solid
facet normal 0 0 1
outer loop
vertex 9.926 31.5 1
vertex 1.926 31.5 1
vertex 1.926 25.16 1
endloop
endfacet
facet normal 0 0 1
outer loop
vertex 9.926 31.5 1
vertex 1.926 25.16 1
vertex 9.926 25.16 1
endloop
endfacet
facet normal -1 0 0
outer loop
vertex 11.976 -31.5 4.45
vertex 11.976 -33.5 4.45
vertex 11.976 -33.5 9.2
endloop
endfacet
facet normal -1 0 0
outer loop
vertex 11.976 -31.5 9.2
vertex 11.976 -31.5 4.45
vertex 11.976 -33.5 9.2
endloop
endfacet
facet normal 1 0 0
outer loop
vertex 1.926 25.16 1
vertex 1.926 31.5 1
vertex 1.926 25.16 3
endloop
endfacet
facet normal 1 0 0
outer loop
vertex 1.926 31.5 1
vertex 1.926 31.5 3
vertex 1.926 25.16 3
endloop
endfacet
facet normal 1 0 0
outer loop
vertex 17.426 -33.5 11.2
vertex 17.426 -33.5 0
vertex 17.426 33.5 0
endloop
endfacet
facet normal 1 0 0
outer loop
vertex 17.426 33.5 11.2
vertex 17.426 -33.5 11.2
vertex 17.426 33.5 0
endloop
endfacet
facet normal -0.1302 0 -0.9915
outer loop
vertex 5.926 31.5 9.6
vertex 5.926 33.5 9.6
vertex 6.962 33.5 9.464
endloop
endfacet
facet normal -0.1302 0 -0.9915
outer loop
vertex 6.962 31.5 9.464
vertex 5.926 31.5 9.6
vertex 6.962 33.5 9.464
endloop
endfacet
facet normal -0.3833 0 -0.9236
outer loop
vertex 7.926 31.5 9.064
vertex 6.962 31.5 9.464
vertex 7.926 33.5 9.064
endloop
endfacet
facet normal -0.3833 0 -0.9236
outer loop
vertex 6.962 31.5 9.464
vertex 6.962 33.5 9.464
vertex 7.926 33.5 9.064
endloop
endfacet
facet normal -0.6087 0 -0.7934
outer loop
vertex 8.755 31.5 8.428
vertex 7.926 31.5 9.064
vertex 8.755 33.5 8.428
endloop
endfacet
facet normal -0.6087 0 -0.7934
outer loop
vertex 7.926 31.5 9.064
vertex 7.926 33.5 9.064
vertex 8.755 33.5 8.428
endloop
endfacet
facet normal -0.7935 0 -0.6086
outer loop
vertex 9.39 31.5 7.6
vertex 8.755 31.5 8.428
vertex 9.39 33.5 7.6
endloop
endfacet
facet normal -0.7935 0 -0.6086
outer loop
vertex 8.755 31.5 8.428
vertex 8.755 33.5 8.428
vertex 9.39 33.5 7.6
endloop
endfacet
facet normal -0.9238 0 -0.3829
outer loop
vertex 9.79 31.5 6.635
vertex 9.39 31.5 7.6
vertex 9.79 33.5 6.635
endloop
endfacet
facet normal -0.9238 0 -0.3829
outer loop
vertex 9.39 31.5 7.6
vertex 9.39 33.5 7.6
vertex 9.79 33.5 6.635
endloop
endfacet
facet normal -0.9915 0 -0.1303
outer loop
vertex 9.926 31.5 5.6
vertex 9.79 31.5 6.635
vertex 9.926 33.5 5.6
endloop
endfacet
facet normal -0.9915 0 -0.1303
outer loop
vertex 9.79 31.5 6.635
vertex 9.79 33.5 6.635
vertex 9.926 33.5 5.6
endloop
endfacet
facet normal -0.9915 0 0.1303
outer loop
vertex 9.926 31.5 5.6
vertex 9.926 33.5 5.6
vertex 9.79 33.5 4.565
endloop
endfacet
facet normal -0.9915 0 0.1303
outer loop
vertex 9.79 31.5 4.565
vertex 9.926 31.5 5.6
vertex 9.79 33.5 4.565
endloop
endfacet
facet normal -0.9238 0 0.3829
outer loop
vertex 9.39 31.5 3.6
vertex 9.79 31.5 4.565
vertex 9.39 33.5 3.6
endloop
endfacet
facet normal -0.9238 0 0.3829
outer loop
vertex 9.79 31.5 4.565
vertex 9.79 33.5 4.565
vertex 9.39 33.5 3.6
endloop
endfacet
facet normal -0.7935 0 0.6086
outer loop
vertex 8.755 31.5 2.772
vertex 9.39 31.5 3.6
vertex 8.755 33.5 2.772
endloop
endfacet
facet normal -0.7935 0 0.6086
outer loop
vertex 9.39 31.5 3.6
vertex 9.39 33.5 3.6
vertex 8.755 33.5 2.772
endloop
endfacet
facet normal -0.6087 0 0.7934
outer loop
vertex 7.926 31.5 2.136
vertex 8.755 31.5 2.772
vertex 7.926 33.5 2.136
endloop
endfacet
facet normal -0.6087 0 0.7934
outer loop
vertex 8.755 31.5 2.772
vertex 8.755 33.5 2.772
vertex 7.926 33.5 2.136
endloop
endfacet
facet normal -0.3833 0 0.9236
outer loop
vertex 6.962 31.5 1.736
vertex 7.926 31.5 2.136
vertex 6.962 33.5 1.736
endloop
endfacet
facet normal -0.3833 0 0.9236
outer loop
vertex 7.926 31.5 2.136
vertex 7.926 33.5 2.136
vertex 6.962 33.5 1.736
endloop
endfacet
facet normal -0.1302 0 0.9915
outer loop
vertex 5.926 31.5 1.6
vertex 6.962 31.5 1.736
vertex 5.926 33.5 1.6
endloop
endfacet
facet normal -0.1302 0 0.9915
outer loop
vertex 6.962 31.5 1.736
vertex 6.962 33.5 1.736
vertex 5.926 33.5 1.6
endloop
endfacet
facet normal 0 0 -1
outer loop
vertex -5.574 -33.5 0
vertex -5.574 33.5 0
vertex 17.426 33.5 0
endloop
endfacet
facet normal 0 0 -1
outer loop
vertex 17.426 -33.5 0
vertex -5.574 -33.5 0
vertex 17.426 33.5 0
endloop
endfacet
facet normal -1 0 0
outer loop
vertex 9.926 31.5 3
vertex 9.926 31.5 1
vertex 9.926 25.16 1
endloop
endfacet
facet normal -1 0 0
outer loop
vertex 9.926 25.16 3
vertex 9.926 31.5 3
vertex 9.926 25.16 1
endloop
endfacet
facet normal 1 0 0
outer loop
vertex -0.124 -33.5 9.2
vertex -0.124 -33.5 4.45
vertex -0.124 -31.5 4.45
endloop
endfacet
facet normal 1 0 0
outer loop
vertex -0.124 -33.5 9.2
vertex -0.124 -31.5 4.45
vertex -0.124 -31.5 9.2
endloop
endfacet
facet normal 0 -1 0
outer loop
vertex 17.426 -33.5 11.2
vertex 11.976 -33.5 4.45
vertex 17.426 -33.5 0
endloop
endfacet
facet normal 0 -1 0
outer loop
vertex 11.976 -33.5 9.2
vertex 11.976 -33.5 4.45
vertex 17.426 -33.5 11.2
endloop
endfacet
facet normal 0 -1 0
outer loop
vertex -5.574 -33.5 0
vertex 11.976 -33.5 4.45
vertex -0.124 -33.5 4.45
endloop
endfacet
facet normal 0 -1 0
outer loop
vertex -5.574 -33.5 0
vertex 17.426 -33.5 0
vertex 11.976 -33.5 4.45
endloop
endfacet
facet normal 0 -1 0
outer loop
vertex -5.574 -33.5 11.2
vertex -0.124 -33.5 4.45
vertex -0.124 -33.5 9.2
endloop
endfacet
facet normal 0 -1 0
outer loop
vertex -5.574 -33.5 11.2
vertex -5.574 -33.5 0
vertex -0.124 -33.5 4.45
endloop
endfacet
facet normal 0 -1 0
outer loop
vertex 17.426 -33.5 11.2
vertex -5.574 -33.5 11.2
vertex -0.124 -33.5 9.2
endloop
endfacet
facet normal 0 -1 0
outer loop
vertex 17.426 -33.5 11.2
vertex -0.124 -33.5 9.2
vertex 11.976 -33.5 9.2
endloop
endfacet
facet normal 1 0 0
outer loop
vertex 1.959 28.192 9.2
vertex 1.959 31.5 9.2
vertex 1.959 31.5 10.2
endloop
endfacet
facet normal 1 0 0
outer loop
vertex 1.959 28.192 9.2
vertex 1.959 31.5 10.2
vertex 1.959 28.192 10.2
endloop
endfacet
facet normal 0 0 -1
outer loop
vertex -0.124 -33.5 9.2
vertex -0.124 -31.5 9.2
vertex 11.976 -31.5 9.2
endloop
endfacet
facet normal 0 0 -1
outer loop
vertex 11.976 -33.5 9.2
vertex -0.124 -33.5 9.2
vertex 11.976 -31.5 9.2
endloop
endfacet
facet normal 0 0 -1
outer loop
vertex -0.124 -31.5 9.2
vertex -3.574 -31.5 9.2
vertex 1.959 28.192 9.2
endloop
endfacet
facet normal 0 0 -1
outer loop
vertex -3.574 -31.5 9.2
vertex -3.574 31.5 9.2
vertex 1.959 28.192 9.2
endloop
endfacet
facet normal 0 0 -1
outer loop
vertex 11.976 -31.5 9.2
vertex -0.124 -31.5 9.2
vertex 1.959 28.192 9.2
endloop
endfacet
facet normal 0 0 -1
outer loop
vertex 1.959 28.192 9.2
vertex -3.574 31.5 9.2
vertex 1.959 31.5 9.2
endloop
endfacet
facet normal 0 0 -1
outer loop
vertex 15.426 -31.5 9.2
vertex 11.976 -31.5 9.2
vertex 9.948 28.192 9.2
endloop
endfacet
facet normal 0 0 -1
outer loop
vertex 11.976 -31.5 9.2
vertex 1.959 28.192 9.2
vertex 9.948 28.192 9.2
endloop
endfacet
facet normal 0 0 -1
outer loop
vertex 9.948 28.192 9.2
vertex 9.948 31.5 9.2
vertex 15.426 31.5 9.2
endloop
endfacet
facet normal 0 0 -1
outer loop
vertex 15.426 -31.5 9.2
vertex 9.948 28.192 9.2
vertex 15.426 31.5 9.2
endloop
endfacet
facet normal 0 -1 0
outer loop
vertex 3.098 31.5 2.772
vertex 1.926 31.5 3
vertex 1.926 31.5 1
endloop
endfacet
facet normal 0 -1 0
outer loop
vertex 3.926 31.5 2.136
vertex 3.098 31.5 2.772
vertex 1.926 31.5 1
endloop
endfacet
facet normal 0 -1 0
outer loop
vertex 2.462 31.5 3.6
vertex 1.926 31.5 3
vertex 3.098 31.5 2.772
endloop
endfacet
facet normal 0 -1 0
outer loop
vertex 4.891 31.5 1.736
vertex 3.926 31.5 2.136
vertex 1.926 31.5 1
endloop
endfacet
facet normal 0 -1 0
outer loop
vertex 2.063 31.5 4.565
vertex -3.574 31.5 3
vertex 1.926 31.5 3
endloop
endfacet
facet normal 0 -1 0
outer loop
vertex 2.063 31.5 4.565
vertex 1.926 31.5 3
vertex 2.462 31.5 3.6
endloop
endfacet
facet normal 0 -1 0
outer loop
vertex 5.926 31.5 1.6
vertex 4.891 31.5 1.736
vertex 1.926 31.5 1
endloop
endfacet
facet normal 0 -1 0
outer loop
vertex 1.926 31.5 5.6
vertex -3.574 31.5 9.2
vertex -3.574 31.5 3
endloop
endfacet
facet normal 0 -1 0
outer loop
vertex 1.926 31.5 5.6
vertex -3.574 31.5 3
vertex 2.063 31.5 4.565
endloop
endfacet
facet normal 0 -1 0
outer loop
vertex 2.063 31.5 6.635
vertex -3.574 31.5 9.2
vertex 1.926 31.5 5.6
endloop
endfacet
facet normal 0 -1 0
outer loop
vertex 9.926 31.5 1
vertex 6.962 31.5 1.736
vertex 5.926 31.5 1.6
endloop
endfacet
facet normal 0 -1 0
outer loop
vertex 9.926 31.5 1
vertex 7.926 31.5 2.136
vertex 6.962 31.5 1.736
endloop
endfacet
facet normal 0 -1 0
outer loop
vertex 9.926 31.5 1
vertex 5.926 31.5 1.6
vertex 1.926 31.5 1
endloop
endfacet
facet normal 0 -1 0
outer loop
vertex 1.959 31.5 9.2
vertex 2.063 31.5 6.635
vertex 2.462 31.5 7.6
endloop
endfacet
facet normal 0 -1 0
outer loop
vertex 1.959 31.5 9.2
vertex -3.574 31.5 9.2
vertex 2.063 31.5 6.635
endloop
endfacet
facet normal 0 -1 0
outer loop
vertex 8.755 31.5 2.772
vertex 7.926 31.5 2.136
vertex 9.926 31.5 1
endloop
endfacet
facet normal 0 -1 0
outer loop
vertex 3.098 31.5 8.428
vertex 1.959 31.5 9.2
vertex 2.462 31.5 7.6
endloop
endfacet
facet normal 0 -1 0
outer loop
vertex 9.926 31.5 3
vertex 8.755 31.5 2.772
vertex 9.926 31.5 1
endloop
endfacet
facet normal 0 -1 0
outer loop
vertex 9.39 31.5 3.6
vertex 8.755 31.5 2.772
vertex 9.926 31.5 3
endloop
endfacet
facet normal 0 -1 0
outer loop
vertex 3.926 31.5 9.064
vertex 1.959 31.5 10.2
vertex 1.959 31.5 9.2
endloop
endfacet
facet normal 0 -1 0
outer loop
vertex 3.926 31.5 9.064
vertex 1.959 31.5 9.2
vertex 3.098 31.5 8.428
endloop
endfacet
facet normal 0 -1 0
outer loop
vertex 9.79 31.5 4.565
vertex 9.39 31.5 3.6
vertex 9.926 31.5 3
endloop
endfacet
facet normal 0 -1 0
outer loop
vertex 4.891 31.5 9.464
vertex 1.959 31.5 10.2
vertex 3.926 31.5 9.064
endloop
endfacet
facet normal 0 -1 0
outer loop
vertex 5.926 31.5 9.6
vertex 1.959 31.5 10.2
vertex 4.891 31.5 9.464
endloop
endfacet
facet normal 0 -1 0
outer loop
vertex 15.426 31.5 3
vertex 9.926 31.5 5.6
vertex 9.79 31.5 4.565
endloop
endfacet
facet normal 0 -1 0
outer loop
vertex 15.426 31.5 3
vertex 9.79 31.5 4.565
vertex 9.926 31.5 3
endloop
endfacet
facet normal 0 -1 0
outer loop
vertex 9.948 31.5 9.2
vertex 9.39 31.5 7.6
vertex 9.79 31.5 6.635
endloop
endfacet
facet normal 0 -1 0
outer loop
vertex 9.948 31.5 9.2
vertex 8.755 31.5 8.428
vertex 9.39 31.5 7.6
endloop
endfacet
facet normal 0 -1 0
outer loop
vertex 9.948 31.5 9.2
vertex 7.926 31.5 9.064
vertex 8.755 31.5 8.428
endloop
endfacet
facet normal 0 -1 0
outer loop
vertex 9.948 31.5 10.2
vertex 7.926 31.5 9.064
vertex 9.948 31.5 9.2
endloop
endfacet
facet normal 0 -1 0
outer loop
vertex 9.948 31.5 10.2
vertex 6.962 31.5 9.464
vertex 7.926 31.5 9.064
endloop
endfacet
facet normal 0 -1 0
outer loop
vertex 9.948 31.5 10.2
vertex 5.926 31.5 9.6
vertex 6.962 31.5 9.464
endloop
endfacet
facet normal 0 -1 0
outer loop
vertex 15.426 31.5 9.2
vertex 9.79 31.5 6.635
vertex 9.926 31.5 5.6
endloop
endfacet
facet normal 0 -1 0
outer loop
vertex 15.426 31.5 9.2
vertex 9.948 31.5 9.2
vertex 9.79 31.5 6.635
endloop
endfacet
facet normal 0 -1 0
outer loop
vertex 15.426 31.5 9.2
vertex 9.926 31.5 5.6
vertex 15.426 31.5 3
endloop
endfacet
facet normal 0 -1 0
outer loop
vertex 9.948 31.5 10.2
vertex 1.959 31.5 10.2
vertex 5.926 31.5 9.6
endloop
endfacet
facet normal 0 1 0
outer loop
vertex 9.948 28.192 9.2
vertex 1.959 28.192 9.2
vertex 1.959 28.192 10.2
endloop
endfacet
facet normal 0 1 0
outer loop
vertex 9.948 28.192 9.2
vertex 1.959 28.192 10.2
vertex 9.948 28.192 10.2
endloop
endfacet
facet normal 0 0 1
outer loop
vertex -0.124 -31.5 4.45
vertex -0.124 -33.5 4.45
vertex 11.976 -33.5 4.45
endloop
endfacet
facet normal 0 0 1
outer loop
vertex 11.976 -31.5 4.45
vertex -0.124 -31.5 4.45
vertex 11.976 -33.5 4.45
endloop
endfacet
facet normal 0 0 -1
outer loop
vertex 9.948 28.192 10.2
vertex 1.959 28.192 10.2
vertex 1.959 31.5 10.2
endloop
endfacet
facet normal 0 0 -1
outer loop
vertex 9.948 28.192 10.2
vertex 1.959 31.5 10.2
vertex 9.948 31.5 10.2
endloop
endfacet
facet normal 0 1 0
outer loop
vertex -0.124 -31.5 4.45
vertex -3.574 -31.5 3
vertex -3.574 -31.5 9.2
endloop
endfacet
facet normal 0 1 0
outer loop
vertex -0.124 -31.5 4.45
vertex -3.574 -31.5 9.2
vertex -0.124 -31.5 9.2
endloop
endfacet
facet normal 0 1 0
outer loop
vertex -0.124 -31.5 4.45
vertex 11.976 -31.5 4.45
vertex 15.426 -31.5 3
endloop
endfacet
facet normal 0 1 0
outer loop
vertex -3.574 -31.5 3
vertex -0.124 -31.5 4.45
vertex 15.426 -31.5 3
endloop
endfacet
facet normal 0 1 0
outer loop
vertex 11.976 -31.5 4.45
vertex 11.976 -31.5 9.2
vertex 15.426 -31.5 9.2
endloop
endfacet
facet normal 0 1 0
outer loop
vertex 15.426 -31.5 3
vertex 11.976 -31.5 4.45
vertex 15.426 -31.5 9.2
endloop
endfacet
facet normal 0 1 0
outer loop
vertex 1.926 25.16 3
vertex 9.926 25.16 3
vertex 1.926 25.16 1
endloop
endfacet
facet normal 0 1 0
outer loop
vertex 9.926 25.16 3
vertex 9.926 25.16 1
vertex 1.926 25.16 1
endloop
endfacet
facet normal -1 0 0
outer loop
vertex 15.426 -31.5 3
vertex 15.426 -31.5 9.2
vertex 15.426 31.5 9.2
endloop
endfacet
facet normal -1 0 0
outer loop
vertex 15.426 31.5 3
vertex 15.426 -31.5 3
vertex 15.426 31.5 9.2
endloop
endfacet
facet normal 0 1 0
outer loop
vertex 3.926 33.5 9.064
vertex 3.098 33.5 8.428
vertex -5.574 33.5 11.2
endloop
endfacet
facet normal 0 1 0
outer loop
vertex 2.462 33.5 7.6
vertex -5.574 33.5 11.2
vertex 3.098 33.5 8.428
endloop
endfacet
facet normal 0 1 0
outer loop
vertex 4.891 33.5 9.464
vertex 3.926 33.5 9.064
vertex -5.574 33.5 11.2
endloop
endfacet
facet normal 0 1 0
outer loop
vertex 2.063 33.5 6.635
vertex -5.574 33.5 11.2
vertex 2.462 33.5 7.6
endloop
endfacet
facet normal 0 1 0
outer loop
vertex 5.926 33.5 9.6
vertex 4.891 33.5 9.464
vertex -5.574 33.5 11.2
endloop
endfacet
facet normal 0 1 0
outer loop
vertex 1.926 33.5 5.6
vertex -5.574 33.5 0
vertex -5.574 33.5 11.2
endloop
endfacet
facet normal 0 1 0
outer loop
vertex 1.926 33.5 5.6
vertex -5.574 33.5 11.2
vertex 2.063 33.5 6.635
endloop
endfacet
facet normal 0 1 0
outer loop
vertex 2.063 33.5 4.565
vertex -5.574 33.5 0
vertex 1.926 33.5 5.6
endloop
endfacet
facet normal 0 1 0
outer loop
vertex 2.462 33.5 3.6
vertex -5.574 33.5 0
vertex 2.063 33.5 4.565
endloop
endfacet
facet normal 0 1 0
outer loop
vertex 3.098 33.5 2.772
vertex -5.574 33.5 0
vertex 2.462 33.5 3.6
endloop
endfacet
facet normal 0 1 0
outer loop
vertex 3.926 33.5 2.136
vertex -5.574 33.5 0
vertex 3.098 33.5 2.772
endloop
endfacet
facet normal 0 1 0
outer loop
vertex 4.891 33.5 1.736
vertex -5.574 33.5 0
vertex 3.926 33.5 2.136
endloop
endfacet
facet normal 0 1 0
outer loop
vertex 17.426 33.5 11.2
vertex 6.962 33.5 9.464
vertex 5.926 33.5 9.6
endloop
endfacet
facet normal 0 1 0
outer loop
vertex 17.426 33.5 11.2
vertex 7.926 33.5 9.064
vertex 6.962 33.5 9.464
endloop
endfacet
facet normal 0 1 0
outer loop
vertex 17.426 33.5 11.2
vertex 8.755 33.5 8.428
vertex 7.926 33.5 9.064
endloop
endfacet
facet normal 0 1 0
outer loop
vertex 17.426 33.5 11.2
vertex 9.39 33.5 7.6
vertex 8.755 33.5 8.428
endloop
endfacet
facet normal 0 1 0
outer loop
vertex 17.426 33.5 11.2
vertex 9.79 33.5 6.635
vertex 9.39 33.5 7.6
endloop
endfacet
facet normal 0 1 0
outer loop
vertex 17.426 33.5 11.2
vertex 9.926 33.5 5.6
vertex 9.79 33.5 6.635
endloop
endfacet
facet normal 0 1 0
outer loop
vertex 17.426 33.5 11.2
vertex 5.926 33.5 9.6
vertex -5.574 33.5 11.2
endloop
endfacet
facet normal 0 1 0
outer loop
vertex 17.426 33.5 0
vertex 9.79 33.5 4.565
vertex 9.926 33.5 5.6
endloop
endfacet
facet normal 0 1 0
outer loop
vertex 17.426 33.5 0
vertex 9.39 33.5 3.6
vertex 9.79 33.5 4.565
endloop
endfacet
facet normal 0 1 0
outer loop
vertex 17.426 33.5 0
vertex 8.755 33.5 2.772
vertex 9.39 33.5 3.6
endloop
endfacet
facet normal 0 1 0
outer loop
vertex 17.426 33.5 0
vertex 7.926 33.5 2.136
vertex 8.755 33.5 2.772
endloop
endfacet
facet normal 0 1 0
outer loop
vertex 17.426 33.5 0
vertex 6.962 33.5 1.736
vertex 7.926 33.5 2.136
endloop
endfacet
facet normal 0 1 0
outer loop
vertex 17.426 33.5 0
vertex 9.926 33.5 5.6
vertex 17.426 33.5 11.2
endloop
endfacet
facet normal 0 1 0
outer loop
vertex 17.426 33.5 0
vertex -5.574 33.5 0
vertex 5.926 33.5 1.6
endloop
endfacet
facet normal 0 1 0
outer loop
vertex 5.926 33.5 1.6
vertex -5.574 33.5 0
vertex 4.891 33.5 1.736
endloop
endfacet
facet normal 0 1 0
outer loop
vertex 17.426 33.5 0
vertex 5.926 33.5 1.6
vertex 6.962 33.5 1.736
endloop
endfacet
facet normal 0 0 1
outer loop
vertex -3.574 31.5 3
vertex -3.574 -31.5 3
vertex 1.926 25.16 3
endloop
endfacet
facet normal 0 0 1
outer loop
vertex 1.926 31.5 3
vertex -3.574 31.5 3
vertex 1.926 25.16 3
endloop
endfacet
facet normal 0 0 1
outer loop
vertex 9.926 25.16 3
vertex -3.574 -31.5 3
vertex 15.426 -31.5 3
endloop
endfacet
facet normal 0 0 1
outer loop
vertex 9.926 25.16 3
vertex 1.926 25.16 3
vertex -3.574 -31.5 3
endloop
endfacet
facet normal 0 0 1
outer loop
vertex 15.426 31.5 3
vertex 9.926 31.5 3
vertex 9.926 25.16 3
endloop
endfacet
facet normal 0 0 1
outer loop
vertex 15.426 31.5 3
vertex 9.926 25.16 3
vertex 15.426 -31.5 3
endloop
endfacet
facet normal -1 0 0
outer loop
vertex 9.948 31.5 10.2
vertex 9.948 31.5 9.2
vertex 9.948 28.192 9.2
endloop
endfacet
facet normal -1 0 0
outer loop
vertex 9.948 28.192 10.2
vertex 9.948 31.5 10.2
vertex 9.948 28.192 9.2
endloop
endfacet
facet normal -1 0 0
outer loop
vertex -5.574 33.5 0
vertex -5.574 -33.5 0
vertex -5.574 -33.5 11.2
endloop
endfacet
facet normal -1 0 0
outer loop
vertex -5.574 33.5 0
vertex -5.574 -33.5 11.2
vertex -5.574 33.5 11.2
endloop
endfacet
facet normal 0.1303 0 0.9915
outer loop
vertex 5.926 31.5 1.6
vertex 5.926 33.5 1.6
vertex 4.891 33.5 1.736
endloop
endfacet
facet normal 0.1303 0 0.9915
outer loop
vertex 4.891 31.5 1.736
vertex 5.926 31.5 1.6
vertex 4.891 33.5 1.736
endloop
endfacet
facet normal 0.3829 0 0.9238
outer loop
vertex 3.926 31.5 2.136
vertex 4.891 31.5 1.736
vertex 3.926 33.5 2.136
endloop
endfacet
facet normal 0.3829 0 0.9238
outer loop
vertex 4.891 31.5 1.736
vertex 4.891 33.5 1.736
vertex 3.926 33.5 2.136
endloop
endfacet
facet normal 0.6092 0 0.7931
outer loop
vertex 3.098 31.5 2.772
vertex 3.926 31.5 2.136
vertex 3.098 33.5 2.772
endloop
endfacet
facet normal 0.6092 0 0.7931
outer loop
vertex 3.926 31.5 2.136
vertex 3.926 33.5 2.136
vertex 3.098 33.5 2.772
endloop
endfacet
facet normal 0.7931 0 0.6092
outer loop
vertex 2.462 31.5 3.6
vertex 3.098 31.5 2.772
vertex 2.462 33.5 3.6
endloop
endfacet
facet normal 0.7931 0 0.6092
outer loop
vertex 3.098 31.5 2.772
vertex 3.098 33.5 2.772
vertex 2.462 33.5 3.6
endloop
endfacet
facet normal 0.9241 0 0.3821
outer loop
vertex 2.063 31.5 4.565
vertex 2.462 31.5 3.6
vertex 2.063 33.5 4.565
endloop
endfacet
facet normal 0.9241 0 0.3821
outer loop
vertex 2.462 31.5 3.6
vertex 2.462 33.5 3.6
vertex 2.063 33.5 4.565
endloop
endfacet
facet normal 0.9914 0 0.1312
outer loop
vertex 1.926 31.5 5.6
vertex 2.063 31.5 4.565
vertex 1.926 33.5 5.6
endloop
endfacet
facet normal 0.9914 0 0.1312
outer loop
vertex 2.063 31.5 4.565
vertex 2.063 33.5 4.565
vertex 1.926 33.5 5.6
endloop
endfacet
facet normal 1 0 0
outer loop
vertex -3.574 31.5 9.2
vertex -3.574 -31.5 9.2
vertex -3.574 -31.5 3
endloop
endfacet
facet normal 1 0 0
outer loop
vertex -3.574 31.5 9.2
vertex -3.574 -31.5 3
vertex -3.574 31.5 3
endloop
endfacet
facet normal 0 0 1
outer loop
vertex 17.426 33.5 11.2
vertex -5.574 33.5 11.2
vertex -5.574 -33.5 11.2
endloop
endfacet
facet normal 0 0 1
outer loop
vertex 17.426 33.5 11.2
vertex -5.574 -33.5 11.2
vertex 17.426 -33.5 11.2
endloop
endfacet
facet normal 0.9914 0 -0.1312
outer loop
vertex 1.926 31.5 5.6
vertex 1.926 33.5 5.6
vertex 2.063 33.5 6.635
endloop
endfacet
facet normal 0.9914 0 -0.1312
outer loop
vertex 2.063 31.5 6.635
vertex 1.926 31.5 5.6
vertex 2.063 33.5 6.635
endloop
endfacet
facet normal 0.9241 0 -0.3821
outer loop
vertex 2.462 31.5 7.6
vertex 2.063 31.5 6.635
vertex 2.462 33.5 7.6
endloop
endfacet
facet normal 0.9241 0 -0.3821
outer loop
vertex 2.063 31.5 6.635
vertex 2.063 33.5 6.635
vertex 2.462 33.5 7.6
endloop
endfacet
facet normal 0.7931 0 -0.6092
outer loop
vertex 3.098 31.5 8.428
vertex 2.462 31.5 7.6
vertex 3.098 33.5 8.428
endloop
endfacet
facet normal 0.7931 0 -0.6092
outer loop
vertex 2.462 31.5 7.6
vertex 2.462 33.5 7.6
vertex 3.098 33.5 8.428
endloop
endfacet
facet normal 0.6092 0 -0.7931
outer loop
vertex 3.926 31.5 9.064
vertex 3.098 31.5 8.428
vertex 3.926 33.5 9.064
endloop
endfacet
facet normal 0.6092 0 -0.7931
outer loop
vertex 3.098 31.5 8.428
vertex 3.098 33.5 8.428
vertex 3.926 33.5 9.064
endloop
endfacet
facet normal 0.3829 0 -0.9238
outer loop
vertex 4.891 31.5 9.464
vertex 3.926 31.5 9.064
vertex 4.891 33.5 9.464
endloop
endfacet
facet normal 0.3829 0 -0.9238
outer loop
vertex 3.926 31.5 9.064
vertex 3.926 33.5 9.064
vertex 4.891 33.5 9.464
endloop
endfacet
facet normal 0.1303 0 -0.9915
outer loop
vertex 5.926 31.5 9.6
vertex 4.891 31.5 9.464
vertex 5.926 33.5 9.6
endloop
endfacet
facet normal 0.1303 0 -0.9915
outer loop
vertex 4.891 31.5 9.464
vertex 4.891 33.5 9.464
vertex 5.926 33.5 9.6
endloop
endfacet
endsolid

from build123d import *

# Parameters (mm, degrees)
F0_W      = 23
F0_H      = 67
F1_DEPTH  = 11.2
F2_W      = 19
F2_H      = 63
F3_DEPTH  = 9.2
F4_W      = 12.1
F4_H      = 13.5
F5_DEPTH  = 12
F7_DEPTH  = 2
F9_DEPTH  = 1
F11_DEPTH = 1
F12_W     = 63
F12_H     = 1.9999997959
F13_DEPTH = 21
F14_DEPTH = 2
F15_W     = 7.9889474437
F15_H     = 3.3084521592
F16_DEPTH = 1


with BuildPart() as f1:
    # F0 (on Top) → F1 (new body)
    with BuildSketch(Plane.XY):
        with Locations((5.9262745458, 0)):
            Rectangle(F0_W, F0_H)
    extrude(amount=F1_DEPTH)

    # F2 (on face) → F3 (cut)
    with BuildSketch(Plane.XY.offset(11.2)):
        with Locations((5.9262745458, 0)):
            Rectangle(F2_W, F2_H)
    extrude(amount=-F3_DEPTH, mode=Mode.SUBTRACT)

    # F4 (on face) → F5 (cut)
    with BuildSketch(Plane.XZ.offset(33.5)):
        with Locations((5.9262745458, 11.2)):
            Rectangle(F4_W, F4_H)
    extrude(amount=-F5_DEPTH, mode=Mode.SUBTRACT)

    # F6 (on face) → F7 (cut)
    with BuildSketch(Plane(origin=(0, 33.5, 0), x_dir=(-1, 0, 0), z_dir=(0, 1, 0))):
        with BuildLine():
            ThreePointArc((-5.9262745458, 9.6), (-8.7547016705, 8.4284271247), (-9.9262745458, 5.6))
            Line((-9.9262745458, 5.6), (-5.9262745458, 5.6))
            Line((-5.9262745458, 5.6), (-5.9262745458, 9.6))
        make_face()
        with BuildLine():
            Line((-5.9262745458, 5.6), (-9.9262745458, 5.6))
            ThreePointArc((-9.9262745458, 5.6), (-8.7547016705, 2.7715728753), (-5.9262745458, 1.6))
            Line((-5.9262745458, 1.6), (-5.9262745458, 5.6))
        make_face()
        with BuildLine():
            Line((-5.9262745458, 9.6), (-5.9262745458, 5.6))
            Line((-5.9262745458, 5.6), (-1.9262745458, 5.6))
            ThreePointArc((-1.9262745458, 5.6), (-3.097847421, 8.4284271247), (-5.9262745458, 9.6))
        make_face()
        with BuildLine():
            Line((-1.9262745458, 5.6), (-5.9262745458, 5.6))
            Line((-5.9262745458, 5.6), (-5.9262745458, 1.6))
            ThreePointArc((-5.9262745458, 1.6), (-3.097847421, 2.7715728753), (-1.9262745458, 5.6))
        make_face()
    extrude(amount=-F7_DEPTH, mode=Mode.SUBTRACT)

    # F8 (on face) → F9 (cut)
    with BuildSketch(Plane.XY.offset(2)):
        Polygon((4.1827149684, 31.5), (1.9262745458, 31.5), (1.9262745458, 25.1600015908), (9.9262745458, 25.1600015908), (9.9262745458, 31.5), (7.6698341232, 31.5), align=None)
    extrude(amount=-F9_DEPTH, mode=Mode.SUBTRACT)

    # F10 (on face) → F11 (join)
    with BuildSketch(Plane.XY.offset(2)):
        Polygon((1.9262745458, 31.5), (-3.5737254542, 31.5), (-3.5737254542, -31.5), (15.4262745458, -31.5), (15.4262745458, 31.5), (9.9262745458, 31.5), (9.9262745458, 25.1600015908), (1.9262745458, 25.1600015908), align=None)
    extrude(amount=F11_DEPTH)

    # F12 (on face) → F13 (join)
    with BuildSketch(Plane.YZ.offset(-3.5737254542)):
        with Locations((0, 10.2000001021)):
            Rectangle(F12_W, F12_H)
    extrude(amount=F13_DEPTH)

    # F14 (add): a face of the model
    f14_faces = [f1.faces().sort_by_distance(p)[0] for p in [
        (5.9262745458, -31.5, 10.2000001021),
    ]]
    extrude(f14_faces, amount=F14_DEPTH)

    # F15 (on face) → F16 (cut)
    with BuildSketch(Plane(origin=(0, 0, 9.2000002041), x_dir=(1, 0, 0), z_dir=(0, 0, -1))):
        with Locations((5.9536970221, -29.8457739204)):
            Rectangle(F15_W, F15_H)
    extrude(amount=-F16_DEPTH, mode=Mode.SUBTRACT)


solid = f1.part
